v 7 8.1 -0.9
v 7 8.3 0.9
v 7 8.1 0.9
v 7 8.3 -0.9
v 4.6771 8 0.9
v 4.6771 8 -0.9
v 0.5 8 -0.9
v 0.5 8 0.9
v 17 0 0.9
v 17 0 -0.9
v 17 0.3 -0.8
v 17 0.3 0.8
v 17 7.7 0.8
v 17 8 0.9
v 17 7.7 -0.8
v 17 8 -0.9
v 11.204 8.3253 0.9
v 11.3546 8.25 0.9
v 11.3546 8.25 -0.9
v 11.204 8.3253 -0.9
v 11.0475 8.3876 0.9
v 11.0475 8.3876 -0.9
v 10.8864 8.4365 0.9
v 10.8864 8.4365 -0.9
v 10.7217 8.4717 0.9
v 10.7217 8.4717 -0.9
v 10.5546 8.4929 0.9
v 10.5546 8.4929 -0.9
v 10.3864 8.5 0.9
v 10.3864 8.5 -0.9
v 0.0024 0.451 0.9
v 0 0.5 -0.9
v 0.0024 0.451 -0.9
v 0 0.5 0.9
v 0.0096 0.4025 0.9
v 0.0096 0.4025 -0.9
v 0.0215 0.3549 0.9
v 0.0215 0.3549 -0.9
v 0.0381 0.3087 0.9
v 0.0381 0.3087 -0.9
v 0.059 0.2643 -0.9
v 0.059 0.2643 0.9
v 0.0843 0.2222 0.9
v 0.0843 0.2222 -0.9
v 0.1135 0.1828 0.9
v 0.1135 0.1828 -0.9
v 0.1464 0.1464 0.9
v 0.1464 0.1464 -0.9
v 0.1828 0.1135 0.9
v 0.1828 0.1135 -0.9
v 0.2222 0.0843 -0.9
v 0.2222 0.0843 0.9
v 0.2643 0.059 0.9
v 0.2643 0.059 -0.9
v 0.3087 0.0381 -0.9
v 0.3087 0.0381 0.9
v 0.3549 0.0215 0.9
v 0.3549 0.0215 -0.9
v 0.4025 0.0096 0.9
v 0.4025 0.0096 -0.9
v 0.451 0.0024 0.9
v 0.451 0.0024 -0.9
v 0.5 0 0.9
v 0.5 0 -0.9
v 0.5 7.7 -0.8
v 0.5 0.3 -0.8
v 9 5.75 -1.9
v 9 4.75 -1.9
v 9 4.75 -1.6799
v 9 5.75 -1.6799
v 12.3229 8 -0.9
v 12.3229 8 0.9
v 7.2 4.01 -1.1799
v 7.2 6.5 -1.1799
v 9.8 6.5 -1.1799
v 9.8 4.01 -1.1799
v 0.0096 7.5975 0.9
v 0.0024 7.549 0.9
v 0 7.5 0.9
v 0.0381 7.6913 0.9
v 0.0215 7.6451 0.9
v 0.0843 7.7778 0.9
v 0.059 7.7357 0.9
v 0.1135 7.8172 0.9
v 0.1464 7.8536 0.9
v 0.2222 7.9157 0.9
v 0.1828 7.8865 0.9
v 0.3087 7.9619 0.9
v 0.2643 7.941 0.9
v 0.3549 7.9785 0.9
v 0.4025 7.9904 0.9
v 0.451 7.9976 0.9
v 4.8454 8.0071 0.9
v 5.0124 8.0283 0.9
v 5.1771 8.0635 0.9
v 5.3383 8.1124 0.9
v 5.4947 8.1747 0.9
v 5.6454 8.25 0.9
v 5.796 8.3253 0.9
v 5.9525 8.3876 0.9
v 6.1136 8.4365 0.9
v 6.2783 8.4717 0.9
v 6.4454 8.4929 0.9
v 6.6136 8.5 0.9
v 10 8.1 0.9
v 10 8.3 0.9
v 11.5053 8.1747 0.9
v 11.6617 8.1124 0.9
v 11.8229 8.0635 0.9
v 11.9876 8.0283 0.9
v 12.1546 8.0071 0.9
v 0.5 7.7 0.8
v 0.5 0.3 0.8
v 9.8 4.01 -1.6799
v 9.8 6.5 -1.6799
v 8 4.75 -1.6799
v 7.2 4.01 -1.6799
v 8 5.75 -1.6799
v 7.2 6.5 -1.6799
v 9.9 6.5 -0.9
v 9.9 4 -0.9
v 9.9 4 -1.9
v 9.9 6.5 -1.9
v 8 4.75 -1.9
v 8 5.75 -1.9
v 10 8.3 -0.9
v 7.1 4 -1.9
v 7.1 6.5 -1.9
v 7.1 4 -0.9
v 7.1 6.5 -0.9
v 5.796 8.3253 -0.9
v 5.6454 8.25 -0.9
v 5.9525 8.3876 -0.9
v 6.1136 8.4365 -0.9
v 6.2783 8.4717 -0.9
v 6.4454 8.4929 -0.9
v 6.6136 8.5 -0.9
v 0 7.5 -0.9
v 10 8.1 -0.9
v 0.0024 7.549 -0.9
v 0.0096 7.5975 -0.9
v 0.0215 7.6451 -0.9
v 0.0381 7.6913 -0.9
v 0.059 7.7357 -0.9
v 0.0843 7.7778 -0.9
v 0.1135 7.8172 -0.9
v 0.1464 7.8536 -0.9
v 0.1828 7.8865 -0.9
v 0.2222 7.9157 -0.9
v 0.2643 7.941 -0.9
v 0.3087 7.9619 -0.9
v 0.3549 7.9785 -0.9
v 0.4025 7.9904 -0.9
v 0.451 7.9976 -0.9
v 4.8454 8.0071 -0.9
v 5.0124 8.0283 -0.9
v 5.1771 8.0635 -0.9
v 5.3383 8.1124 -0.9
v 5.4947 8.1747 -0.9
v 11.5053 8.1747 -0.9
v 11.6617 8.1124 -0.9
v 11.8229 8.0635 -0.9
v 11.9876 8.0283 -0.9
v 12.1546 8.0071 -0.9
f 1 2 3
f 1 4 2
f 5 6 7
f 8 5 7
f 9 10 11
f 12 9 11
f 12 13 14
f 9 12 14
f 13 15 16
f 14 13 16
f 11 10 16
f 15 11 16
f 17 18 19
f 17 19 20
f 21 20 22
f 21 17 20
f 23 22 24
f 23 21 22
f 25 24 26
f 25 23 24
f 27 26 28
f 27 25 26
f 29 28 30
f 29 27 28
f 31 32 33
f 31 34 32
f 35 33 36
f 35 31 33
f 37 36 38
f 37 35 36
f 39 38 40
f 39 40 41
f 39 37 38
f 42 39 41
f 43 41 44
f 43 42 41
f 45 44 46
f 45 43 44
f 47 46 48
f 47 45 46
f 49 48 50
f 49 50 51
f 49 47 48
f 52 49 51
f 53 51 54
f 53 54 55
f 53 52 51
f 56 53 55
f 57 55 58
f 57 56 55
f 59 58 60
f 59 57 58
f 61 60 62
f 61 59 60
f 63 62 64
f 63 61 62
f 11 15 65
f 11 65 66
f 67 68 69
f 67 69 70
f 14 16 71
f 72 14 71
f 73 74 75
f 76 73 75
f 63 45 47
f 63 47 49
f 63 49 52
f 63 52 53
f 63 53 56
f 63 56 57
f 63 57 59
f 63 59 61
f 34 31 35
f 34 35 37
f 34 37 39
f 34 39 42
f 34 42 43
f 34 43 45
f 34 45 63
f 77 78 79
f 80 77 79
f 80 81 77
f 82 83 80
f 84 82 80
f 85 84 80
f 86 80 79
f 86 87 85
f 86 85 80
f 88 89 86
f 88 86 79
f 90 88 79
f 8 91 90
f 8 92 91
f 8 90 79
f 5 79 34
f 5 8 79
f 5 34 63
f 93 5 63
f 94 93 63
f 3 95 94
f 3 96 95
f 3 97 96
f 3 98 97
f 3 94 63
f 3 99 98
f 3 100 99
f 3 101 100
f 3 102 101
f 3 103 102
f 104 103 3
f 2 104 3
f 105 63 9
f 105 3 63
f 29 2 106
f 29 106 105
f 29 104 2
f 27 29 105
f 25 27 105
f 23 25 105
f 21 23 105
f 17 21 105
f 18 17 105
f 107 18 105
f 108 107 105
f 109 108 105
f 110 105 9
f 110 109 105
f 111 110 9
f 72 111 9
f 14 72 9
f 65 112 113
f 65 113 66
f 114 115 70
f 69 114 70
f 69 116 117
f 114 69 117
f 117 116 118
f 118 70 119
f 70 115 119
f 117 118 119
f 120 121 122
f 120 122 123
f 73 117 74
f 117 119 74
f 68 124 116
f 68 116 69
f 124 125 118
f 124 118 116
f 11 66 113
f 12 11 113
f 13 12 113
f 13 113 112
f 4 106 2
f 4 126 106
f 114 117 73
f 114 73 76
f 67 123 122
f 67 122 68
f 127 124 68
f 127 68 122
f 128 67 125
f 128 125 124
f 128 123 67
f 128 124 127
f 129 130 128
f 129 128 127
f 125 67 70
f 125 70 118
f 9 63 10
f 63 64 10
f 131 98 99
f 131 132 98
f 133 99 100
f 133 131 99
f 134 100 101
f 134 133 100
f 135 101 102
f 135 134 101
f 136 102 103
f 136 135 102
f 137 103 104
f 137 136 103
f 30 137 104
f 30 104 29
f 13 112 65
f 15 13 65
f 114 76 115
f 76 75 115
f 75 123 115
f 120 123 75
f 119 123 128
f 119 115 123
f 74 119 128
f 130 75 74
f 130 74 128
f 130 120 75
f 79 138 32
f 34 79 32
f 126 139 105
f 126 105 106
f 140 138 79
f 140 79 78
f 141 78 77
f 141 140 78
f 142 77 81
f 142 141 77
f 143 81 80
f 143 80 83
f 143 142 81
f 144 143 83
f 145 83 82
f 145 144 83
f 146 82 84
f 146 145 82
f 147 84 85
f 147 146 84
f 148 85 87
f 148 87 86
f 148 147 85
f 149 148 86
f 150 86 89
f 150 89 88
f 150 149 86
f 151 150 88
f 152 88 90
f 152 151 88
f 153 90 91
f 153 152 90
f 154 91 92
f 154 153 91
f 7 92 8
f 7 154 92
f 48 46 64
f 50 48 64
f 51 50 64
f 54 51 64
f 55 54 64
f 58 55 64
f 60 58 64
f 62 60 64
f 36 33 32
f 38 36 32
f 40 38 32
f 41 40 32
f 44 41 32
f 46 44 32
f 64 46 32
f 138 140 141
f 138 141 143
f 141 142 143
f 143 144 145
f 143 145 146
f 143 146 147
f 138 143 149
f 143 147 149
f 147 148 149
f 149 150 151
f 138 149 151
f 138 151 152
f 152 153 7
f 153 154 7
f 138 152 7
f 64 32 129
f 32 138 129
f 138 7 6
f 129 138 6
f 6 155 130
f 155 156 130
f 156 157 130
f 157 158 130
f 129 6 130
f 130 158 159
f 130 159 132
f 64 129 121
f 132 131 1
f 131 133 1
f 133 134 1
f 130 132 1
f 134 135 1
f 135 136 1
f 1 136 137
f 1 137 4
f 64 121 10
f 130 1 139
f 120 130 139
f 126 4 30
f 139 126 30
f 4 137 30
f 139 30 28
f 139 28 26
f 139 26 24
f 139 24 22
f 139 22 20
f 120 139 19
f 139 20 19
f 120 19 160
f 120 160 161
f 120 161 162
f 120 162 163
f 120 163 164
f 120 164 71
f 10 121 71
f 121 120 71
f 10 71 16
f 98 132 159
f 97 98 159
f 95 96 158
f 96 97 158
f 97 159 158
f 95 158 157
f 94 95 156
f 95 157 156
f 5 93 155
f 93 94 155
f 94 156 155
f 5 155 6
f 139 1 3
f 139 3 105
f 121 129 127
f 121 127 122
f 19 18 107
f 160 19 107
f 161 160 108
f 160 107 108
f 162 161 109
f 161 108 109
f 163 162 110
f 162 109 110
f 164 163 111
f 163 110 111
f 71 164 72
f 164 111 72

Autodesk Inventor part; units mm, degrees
ref_plane "YZ Plane" through (0, 0, 0) normal (1, 0, 0) x (0, 1, 0)
ref_plane "XZ Plane" through (0, 0, 0) normal (0, 1, 0) x (-1, 0, 0)
sketch "스케치1" plane through (0, 0, 0) normal (0, 0, 1) x (1, 0, 0)
  line L0 (0, 0) -> (17, 0)
  line L1 (17, 0) -> (17, 8)
  line L2 (17, 8) -> (0, 8)
  line L3 (0, 8) -> (0, 0)
  line L4 (0, 4.8) -> (17, 4.8)
  line L5 (15, 8) -> (15, 0)
  dimension "d0" = 17
  dimension "d1" = 8
  dimension "d3" = 4.8
  dimension "d4" = 15
extrude "돌출1" add sketch "스케치1" along normal mid plane 1.8
sketch "스케치3" plane through (0, 0, 0.9) normal (-1, 0, 0) x (0, 0, 1)
  line L0 (-1.8, 0) -> (0, 0) projected
  line L1 (-1.8, 0) -> (-1.8, 8) projected
  line L2 (-1.7, 7.7) -> (-0.1, 7.7)
  line L3 (-0.1, 7.7) -> (-0.1, 0.3)
  line L4 (-0.1, 0.3) -> (-1.7, 0.3)
  line L5 (-1.7, 0.3) -> (-1.7, 7.7)
  line L6 (-1.8, 8) -> (0, 8) projected
  line L7 (0, 8) -> (0, 0) projected
  point P0 (-0.9, 0)
  dimension "d11" = 0.3
  dimension "d12" = 0.3
  dimension "d13" = 0.1
  dimension "d14" = 0.1
sketch "스케치5" plane through (0, 0, -0.9) normal (0, 0, -1) x (-1, 0, 0)
  line L0 (0, 0) -> (0, 8) projected
  line L1 (-17, 0) -> (0, 0) projected
  line L2 (-9.9, 6.5) -> (-7.1, 6.5)
  line L3 (-7.1, 6.5) -> (-7.1, 4)
  line L4 (-7.1, 4) -> (-9.9, 4)
  line L5 (-9.9, 4) -> (-9.9, 6.5)
  line L6 (-17, 8) -> (-17, 0) projected
  line L7 (0, 8) -> (-17, 8) projected
  dimension "d21" = 2.8
  dimension "d22" = 2.5
  dimension "d24" = 1.5
  dimension "d25" = 7.1
extrude "돌출3" add sketch "스케치5" along normal blind 1 contours L2 L3 L4 L5
sketch "스케치6" plane through (0, 0, -1.9) normal (0, 0, -1) x (-1, 0, 0)
  line L0 (-9, 5.75) -> (-8, 5.75)
  line L1 (-8, 5.75) -> (-8, 4.75)
  line L2 (-8, 4.75) -> (-9, 4.75)
  line L3 (-9, 4.75) -> (-9, 5.75)
  line L4 (-9, 5.75) -> (-8, 4.75) construction
  line L5 (-8, 5.75) -> (-9, 4.75) construction
  line L6 (0, 8) -> (-17, 8) projected
  line L7 (0, 0) -> (0, 8) projected
  point P0 (-8.5, 5.25)
  dimension "d28" = 1
  dimension "d29" = 1
  dimension "d30" = 2.75
  dimension "d31" = 8.5
sketch "스케치7" plane through (7.1, 6.5, -0.9) normal (0, 1, 0) x (1, 0, 0)
  line L0 (0, 0) -> (0, 1) projected
  line L1 (0.1, 0.2799) -> (2.7, 0.2799)
  line L2 (2.7, 0.2799) -> (2.7, 0.7799)
  line L3 (2.7, 0.7799) -> (0.1, 0.7799)
  line L4 (0.1, 0.7799) -> (0.1, 0.2799)
  point P0 (-7.1, -0.9)
  point P1 (2.8, 0)
  dimension "d32" = 0.5
  dimension "d33" = 2.6
  dimension "d34" = 0.1
extrude "돌출4" cut sketch "스케치7" against normal blind 2.49
extrude "돌출5" cut sketch "스케치6" against normal blind 0.5
sketch "스케치8" plane through (0, 8, 0.9) normal (0, 1, 0) x (1, 0, 0)
  line L0 (17, 1.8) -> (0, 1.8) projected
  line L1 (17, 0) -> (0, 0) projected
  line L2 (11, 1.8) -> (6, 1.8)
  line L3 (6, 1.8) -> (6, 0)
  line L4 (6, 0) -> (11, 0)
  line L5 (11, 0) -> (11, 1.8)
  line L6 (17, 0) -> (17, 1.8) projected
  point P0 (0, 0.9)
  point P1 (11, 0)
  dimension "d39" = 5
  dimension "d40" = 6
extrude "돌출6" add sketch "스케치8" along normal blind 0.5 contours L5 L1 L3 L0
sketch "스케치9" plane through (0, 0, -0.9) normal (0, 0, -1) x (-1, 0, 0)
  line L0 (-10, 8.3) -> (-7, 8.3)
  line L1 (-7, 8.3) -> (-7, 8.1)
  line L2 (-7, 8.1) -> (-10, 8.1)
  line L3 (-10, 8.1) -> (-10, 8.3)
  line L4 (-11, 8) -> (-11, 8.5) projected
  line L5 (-11, 8.5) -> (-6, 8.5) projected
  point P0 (0, 0)
  dimension "d43" = 0.2
  dimension "d44" = 3
  dimension "d45" = 1
  dimension "d46" = 0.2
extrude "돌출7" cut sketch "스케치9" against normal blind 6
fillet "모깎기1" radius 2 4 edges at (11, 8.5, 0) (6, 8.5, 0) (11, 8, 0) (6, 8, 0)
fillet "모깎기3" radius 0.5 2 edges at (0, 0, 0) (0, 8, 0)
ref_plane "작업 평면1" through (17, 2, -0.9) normal (1, 0, 0) x (0, 0, -1)
sketch "스케치10" plane through (17, 2, -0.9) normal (1, 0, 0) x (0, 0, -1)
  line L0 (-1.7, 5.7) -> (-0.1, 5.7)
  line L1 (-0.1, 5.7) -> (-0.1, -1.7)
  line L2 (-0.1, -1.7) -> (-1.7, -1.7)
  line L3 (-1.7, -1.7) -> (-1.7, 5.7)
  line L4 (-1.8, 4) -> (-1.8, 6) projected
  line L5 (0, 4) -> (0, 0) projected
  line L6 (0, 6) -> (-1.8, 6) projected
  line L7 (-1.8, -2) -> (0, -2) projected
  point P0 (-0.9, -2)
  dimension "d52" = 0.1
  dimension "d53" = 0.1
  dimension "d54" = 0.3
  dimension "d55" = 0.3
extrude "돌출8" cut sketch "스케치10" against normal blind 16.5
properties part number "bobecase"
